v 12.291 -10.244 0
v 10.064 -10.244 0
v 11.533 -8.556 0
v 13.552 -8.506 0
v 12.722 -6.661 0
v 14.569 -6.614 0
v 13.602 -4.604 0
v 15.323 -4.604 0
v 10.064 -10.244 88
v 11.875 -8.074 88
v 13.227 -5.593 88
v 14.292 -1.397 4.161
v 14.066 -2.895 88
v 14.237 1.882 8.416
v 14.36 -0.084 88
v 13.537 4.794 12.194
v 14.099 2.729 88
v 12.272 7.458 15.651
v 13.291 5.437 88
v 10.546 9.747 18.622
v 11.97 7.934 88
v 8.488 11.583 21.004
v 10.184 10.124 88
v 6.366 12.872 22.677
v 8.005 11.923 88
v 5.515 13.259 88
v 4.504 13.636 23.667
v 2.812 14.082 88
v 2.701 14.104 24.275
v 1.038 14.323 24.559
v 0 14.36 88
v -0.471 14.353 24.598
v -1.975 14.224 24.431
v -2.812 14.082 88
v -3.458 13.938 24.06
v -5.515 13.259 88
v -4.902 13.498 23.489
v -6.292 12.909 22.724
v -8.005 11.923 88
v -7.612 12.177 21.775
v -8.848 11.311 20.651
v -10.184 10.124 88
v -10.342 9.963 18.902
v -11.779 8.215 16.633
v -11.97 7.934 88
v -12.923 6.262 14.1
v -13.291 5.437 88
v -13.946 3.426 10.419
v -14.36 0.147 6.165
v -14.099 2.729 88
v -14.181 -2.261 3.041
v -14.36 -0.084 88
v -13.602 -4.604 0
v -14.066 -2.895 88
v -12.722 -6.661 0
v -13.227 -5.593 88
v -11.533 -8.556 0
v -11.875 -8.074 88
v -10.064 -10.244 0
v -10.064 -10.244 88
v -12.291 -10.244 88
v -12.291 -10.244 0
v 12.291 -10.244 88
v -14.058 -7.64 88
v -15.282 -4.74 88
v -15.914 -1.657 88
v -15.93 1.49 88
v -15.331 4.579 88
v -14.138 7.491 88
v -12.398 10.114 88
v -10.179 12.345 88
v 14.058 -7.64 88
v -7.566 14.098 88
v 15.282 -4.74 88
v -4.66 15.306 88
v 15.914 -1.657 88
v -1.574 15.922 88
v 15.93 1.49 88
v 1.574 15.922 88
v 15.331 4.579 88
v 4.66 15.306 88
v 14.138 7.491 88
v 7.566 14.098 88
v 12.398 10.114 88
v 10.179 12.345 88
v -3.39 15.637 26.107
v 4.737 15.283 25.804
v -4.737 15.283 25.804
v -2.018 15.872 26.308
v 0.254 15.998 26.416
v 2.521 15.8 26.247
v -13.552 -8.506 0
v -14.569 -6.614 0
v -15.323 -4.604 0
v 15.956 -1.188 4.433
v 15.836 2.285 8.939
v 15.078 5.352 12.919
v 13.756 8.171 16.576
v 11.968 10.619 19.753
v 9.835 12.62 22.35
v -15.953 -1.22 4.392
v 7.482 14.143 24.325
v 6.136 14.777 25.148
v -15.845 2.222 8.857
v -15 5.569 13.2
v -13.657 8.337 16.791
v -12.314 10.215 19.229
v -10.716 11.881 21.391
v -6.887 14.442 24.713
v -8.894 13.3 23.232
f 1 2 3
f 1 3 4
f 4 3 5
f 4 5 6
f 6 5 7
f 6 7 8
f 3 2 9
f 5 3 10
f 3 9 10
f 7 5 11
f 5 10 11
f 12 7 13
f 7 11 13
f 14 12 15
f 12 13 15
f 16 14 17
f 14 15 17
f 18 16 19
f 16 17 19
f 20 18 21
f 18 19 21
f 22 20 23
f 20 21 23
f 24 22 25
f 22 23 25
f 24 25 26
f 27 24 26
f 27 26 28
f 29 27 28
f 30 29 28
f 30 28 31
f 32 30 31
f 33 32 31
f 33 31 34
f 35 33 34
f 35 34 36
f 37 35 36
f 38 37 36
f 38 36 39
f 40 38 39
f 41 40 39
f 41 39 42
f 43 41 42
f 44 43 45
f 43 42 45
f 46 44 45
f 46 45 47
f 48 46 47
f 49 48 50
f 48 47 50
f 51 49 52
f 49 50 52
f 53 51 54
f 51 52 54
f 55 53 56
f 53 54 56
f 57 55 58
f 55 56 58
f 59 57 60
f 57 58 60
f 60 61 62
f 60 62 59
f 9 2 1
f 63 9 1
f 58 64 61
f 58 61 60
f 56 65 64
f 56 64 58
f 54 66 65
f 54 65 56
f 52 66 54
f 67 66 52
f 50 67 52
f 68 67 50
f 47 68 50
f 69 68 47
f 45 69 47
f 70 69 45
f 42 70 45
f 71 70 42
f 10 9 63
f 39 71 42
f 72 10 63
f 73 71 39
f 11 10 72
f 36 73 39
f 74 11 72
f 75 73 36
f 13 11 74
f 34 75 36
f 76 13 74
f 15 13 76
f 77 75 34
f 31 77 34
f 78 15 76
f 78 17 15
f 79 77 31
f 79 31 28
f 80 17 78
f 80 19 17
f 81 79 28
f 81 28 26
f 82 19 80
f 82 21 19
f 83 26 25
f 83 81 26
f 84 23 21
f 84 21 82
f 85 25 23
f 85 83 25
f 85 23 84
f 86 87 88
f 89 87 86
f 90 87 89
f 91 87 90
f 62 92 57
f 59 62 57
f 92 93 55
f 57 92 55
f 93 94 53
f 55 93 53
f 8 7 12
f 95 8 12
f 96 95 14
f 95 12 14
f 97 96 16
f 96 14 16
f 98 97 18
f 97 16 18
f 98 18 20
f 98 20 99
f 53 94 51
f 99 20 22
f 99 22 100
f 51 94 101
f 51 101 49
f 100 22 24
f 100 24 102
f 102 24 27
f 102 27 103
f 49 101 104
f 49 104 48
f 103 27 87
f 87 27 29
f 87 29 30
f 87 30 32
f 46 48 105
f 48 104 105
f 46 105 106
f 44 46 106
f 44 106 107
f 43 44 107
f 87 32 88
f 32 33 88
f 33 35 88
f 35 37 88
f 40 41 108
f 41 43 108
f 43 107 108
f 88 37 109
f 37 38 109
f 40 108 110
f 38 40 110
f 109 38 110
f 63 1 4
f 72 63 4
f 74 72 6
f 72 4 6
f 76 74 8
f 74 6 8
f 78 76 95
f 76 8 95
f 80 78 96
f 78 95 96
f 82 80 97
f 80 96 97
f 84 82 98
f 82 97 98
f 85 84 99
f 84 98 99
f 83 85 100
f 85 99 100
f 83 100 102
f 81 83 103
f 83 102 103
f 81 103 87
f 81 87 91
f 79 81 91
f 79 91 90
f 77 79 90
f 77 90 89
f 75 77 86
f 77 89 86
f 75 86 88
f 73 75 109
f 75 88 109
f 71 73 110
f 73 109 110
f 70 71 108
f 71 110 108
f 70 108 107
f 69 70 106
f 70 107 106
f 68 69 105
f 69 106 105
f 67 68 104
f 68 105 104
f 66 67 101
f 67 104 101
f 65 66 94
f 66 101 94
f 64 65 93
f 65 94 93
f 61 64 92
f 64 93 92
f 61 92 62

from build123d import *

# Parameters (mm, degrees)
SKETCH1_R               = 16
BOSS_EXTRUDE1_DEPTH     = 88
SKETCH2_R               = 14.360467733
CUT_EXTRUDE1_DEPTH      = 88
SKETCH3_W               = 41.504964389
SKETCH3_H               = 7.516490838
CUT_EXTRUDE2_DEPTH      = 88
CUT_EXTRUDE3_DEPTH      = 91.862533533
CUT_EXTRUDE3_DEPTH_BACK = 91.862533533


with BuildPart() as part:
    # Sketch1 → Boss-Extrude1 (new body)
    with BuildSketch(Plane.XY):
        Circle(SKETCH1_R)
    extrude(amount=BOSS_EXTRUDE1_DEPTH)

    # Sketch2 → Cut-Extrude1 (cut)
    with BuildSketch(Plane.XY.offset(88)):
        Circle(SKETCH2_R)
    extrude(amount=-CUT_EXTRUDE1_DEPTH, mode=Mode.SUBTRACT)

    # Sketch3 → Cut-Extrude2 (cut)
    with BuildSketch(Plane.XY.offset(88)):
        with Locations((1.087364542, -14.00175825)):
            Rectangle(SKETCH3_W, SKETCH3_H)
    extrude(amount=-CUT_EXTRUDE2_DEPTH, mode=Mode.SUBTRACT)

    # Sketch4 → Cut-Extrude3 (cut, two sides: drawn at the far end of the back side and taken through both)
    with BuildSketch(Plane(origin=(0, 0, 0), x_dir=(0, 0, -1), z_dir=(1, 0, 0)).offset(-CUT_EXTRUDE3_DEPTH_BACK)):
        Polygon((9.063254849, -11.588963216), (-25.804371383, 15.282726161), (-30.207370546, 20.432915897), (5.089153987, 19.311664184), align=None)
    extrude(amount=CUT_EXTRUDE3_DEPTH + CUT_EXTRUDE3_DEPTH_BACK, mode=Mode.SUBTRACT)


solid = part.part
